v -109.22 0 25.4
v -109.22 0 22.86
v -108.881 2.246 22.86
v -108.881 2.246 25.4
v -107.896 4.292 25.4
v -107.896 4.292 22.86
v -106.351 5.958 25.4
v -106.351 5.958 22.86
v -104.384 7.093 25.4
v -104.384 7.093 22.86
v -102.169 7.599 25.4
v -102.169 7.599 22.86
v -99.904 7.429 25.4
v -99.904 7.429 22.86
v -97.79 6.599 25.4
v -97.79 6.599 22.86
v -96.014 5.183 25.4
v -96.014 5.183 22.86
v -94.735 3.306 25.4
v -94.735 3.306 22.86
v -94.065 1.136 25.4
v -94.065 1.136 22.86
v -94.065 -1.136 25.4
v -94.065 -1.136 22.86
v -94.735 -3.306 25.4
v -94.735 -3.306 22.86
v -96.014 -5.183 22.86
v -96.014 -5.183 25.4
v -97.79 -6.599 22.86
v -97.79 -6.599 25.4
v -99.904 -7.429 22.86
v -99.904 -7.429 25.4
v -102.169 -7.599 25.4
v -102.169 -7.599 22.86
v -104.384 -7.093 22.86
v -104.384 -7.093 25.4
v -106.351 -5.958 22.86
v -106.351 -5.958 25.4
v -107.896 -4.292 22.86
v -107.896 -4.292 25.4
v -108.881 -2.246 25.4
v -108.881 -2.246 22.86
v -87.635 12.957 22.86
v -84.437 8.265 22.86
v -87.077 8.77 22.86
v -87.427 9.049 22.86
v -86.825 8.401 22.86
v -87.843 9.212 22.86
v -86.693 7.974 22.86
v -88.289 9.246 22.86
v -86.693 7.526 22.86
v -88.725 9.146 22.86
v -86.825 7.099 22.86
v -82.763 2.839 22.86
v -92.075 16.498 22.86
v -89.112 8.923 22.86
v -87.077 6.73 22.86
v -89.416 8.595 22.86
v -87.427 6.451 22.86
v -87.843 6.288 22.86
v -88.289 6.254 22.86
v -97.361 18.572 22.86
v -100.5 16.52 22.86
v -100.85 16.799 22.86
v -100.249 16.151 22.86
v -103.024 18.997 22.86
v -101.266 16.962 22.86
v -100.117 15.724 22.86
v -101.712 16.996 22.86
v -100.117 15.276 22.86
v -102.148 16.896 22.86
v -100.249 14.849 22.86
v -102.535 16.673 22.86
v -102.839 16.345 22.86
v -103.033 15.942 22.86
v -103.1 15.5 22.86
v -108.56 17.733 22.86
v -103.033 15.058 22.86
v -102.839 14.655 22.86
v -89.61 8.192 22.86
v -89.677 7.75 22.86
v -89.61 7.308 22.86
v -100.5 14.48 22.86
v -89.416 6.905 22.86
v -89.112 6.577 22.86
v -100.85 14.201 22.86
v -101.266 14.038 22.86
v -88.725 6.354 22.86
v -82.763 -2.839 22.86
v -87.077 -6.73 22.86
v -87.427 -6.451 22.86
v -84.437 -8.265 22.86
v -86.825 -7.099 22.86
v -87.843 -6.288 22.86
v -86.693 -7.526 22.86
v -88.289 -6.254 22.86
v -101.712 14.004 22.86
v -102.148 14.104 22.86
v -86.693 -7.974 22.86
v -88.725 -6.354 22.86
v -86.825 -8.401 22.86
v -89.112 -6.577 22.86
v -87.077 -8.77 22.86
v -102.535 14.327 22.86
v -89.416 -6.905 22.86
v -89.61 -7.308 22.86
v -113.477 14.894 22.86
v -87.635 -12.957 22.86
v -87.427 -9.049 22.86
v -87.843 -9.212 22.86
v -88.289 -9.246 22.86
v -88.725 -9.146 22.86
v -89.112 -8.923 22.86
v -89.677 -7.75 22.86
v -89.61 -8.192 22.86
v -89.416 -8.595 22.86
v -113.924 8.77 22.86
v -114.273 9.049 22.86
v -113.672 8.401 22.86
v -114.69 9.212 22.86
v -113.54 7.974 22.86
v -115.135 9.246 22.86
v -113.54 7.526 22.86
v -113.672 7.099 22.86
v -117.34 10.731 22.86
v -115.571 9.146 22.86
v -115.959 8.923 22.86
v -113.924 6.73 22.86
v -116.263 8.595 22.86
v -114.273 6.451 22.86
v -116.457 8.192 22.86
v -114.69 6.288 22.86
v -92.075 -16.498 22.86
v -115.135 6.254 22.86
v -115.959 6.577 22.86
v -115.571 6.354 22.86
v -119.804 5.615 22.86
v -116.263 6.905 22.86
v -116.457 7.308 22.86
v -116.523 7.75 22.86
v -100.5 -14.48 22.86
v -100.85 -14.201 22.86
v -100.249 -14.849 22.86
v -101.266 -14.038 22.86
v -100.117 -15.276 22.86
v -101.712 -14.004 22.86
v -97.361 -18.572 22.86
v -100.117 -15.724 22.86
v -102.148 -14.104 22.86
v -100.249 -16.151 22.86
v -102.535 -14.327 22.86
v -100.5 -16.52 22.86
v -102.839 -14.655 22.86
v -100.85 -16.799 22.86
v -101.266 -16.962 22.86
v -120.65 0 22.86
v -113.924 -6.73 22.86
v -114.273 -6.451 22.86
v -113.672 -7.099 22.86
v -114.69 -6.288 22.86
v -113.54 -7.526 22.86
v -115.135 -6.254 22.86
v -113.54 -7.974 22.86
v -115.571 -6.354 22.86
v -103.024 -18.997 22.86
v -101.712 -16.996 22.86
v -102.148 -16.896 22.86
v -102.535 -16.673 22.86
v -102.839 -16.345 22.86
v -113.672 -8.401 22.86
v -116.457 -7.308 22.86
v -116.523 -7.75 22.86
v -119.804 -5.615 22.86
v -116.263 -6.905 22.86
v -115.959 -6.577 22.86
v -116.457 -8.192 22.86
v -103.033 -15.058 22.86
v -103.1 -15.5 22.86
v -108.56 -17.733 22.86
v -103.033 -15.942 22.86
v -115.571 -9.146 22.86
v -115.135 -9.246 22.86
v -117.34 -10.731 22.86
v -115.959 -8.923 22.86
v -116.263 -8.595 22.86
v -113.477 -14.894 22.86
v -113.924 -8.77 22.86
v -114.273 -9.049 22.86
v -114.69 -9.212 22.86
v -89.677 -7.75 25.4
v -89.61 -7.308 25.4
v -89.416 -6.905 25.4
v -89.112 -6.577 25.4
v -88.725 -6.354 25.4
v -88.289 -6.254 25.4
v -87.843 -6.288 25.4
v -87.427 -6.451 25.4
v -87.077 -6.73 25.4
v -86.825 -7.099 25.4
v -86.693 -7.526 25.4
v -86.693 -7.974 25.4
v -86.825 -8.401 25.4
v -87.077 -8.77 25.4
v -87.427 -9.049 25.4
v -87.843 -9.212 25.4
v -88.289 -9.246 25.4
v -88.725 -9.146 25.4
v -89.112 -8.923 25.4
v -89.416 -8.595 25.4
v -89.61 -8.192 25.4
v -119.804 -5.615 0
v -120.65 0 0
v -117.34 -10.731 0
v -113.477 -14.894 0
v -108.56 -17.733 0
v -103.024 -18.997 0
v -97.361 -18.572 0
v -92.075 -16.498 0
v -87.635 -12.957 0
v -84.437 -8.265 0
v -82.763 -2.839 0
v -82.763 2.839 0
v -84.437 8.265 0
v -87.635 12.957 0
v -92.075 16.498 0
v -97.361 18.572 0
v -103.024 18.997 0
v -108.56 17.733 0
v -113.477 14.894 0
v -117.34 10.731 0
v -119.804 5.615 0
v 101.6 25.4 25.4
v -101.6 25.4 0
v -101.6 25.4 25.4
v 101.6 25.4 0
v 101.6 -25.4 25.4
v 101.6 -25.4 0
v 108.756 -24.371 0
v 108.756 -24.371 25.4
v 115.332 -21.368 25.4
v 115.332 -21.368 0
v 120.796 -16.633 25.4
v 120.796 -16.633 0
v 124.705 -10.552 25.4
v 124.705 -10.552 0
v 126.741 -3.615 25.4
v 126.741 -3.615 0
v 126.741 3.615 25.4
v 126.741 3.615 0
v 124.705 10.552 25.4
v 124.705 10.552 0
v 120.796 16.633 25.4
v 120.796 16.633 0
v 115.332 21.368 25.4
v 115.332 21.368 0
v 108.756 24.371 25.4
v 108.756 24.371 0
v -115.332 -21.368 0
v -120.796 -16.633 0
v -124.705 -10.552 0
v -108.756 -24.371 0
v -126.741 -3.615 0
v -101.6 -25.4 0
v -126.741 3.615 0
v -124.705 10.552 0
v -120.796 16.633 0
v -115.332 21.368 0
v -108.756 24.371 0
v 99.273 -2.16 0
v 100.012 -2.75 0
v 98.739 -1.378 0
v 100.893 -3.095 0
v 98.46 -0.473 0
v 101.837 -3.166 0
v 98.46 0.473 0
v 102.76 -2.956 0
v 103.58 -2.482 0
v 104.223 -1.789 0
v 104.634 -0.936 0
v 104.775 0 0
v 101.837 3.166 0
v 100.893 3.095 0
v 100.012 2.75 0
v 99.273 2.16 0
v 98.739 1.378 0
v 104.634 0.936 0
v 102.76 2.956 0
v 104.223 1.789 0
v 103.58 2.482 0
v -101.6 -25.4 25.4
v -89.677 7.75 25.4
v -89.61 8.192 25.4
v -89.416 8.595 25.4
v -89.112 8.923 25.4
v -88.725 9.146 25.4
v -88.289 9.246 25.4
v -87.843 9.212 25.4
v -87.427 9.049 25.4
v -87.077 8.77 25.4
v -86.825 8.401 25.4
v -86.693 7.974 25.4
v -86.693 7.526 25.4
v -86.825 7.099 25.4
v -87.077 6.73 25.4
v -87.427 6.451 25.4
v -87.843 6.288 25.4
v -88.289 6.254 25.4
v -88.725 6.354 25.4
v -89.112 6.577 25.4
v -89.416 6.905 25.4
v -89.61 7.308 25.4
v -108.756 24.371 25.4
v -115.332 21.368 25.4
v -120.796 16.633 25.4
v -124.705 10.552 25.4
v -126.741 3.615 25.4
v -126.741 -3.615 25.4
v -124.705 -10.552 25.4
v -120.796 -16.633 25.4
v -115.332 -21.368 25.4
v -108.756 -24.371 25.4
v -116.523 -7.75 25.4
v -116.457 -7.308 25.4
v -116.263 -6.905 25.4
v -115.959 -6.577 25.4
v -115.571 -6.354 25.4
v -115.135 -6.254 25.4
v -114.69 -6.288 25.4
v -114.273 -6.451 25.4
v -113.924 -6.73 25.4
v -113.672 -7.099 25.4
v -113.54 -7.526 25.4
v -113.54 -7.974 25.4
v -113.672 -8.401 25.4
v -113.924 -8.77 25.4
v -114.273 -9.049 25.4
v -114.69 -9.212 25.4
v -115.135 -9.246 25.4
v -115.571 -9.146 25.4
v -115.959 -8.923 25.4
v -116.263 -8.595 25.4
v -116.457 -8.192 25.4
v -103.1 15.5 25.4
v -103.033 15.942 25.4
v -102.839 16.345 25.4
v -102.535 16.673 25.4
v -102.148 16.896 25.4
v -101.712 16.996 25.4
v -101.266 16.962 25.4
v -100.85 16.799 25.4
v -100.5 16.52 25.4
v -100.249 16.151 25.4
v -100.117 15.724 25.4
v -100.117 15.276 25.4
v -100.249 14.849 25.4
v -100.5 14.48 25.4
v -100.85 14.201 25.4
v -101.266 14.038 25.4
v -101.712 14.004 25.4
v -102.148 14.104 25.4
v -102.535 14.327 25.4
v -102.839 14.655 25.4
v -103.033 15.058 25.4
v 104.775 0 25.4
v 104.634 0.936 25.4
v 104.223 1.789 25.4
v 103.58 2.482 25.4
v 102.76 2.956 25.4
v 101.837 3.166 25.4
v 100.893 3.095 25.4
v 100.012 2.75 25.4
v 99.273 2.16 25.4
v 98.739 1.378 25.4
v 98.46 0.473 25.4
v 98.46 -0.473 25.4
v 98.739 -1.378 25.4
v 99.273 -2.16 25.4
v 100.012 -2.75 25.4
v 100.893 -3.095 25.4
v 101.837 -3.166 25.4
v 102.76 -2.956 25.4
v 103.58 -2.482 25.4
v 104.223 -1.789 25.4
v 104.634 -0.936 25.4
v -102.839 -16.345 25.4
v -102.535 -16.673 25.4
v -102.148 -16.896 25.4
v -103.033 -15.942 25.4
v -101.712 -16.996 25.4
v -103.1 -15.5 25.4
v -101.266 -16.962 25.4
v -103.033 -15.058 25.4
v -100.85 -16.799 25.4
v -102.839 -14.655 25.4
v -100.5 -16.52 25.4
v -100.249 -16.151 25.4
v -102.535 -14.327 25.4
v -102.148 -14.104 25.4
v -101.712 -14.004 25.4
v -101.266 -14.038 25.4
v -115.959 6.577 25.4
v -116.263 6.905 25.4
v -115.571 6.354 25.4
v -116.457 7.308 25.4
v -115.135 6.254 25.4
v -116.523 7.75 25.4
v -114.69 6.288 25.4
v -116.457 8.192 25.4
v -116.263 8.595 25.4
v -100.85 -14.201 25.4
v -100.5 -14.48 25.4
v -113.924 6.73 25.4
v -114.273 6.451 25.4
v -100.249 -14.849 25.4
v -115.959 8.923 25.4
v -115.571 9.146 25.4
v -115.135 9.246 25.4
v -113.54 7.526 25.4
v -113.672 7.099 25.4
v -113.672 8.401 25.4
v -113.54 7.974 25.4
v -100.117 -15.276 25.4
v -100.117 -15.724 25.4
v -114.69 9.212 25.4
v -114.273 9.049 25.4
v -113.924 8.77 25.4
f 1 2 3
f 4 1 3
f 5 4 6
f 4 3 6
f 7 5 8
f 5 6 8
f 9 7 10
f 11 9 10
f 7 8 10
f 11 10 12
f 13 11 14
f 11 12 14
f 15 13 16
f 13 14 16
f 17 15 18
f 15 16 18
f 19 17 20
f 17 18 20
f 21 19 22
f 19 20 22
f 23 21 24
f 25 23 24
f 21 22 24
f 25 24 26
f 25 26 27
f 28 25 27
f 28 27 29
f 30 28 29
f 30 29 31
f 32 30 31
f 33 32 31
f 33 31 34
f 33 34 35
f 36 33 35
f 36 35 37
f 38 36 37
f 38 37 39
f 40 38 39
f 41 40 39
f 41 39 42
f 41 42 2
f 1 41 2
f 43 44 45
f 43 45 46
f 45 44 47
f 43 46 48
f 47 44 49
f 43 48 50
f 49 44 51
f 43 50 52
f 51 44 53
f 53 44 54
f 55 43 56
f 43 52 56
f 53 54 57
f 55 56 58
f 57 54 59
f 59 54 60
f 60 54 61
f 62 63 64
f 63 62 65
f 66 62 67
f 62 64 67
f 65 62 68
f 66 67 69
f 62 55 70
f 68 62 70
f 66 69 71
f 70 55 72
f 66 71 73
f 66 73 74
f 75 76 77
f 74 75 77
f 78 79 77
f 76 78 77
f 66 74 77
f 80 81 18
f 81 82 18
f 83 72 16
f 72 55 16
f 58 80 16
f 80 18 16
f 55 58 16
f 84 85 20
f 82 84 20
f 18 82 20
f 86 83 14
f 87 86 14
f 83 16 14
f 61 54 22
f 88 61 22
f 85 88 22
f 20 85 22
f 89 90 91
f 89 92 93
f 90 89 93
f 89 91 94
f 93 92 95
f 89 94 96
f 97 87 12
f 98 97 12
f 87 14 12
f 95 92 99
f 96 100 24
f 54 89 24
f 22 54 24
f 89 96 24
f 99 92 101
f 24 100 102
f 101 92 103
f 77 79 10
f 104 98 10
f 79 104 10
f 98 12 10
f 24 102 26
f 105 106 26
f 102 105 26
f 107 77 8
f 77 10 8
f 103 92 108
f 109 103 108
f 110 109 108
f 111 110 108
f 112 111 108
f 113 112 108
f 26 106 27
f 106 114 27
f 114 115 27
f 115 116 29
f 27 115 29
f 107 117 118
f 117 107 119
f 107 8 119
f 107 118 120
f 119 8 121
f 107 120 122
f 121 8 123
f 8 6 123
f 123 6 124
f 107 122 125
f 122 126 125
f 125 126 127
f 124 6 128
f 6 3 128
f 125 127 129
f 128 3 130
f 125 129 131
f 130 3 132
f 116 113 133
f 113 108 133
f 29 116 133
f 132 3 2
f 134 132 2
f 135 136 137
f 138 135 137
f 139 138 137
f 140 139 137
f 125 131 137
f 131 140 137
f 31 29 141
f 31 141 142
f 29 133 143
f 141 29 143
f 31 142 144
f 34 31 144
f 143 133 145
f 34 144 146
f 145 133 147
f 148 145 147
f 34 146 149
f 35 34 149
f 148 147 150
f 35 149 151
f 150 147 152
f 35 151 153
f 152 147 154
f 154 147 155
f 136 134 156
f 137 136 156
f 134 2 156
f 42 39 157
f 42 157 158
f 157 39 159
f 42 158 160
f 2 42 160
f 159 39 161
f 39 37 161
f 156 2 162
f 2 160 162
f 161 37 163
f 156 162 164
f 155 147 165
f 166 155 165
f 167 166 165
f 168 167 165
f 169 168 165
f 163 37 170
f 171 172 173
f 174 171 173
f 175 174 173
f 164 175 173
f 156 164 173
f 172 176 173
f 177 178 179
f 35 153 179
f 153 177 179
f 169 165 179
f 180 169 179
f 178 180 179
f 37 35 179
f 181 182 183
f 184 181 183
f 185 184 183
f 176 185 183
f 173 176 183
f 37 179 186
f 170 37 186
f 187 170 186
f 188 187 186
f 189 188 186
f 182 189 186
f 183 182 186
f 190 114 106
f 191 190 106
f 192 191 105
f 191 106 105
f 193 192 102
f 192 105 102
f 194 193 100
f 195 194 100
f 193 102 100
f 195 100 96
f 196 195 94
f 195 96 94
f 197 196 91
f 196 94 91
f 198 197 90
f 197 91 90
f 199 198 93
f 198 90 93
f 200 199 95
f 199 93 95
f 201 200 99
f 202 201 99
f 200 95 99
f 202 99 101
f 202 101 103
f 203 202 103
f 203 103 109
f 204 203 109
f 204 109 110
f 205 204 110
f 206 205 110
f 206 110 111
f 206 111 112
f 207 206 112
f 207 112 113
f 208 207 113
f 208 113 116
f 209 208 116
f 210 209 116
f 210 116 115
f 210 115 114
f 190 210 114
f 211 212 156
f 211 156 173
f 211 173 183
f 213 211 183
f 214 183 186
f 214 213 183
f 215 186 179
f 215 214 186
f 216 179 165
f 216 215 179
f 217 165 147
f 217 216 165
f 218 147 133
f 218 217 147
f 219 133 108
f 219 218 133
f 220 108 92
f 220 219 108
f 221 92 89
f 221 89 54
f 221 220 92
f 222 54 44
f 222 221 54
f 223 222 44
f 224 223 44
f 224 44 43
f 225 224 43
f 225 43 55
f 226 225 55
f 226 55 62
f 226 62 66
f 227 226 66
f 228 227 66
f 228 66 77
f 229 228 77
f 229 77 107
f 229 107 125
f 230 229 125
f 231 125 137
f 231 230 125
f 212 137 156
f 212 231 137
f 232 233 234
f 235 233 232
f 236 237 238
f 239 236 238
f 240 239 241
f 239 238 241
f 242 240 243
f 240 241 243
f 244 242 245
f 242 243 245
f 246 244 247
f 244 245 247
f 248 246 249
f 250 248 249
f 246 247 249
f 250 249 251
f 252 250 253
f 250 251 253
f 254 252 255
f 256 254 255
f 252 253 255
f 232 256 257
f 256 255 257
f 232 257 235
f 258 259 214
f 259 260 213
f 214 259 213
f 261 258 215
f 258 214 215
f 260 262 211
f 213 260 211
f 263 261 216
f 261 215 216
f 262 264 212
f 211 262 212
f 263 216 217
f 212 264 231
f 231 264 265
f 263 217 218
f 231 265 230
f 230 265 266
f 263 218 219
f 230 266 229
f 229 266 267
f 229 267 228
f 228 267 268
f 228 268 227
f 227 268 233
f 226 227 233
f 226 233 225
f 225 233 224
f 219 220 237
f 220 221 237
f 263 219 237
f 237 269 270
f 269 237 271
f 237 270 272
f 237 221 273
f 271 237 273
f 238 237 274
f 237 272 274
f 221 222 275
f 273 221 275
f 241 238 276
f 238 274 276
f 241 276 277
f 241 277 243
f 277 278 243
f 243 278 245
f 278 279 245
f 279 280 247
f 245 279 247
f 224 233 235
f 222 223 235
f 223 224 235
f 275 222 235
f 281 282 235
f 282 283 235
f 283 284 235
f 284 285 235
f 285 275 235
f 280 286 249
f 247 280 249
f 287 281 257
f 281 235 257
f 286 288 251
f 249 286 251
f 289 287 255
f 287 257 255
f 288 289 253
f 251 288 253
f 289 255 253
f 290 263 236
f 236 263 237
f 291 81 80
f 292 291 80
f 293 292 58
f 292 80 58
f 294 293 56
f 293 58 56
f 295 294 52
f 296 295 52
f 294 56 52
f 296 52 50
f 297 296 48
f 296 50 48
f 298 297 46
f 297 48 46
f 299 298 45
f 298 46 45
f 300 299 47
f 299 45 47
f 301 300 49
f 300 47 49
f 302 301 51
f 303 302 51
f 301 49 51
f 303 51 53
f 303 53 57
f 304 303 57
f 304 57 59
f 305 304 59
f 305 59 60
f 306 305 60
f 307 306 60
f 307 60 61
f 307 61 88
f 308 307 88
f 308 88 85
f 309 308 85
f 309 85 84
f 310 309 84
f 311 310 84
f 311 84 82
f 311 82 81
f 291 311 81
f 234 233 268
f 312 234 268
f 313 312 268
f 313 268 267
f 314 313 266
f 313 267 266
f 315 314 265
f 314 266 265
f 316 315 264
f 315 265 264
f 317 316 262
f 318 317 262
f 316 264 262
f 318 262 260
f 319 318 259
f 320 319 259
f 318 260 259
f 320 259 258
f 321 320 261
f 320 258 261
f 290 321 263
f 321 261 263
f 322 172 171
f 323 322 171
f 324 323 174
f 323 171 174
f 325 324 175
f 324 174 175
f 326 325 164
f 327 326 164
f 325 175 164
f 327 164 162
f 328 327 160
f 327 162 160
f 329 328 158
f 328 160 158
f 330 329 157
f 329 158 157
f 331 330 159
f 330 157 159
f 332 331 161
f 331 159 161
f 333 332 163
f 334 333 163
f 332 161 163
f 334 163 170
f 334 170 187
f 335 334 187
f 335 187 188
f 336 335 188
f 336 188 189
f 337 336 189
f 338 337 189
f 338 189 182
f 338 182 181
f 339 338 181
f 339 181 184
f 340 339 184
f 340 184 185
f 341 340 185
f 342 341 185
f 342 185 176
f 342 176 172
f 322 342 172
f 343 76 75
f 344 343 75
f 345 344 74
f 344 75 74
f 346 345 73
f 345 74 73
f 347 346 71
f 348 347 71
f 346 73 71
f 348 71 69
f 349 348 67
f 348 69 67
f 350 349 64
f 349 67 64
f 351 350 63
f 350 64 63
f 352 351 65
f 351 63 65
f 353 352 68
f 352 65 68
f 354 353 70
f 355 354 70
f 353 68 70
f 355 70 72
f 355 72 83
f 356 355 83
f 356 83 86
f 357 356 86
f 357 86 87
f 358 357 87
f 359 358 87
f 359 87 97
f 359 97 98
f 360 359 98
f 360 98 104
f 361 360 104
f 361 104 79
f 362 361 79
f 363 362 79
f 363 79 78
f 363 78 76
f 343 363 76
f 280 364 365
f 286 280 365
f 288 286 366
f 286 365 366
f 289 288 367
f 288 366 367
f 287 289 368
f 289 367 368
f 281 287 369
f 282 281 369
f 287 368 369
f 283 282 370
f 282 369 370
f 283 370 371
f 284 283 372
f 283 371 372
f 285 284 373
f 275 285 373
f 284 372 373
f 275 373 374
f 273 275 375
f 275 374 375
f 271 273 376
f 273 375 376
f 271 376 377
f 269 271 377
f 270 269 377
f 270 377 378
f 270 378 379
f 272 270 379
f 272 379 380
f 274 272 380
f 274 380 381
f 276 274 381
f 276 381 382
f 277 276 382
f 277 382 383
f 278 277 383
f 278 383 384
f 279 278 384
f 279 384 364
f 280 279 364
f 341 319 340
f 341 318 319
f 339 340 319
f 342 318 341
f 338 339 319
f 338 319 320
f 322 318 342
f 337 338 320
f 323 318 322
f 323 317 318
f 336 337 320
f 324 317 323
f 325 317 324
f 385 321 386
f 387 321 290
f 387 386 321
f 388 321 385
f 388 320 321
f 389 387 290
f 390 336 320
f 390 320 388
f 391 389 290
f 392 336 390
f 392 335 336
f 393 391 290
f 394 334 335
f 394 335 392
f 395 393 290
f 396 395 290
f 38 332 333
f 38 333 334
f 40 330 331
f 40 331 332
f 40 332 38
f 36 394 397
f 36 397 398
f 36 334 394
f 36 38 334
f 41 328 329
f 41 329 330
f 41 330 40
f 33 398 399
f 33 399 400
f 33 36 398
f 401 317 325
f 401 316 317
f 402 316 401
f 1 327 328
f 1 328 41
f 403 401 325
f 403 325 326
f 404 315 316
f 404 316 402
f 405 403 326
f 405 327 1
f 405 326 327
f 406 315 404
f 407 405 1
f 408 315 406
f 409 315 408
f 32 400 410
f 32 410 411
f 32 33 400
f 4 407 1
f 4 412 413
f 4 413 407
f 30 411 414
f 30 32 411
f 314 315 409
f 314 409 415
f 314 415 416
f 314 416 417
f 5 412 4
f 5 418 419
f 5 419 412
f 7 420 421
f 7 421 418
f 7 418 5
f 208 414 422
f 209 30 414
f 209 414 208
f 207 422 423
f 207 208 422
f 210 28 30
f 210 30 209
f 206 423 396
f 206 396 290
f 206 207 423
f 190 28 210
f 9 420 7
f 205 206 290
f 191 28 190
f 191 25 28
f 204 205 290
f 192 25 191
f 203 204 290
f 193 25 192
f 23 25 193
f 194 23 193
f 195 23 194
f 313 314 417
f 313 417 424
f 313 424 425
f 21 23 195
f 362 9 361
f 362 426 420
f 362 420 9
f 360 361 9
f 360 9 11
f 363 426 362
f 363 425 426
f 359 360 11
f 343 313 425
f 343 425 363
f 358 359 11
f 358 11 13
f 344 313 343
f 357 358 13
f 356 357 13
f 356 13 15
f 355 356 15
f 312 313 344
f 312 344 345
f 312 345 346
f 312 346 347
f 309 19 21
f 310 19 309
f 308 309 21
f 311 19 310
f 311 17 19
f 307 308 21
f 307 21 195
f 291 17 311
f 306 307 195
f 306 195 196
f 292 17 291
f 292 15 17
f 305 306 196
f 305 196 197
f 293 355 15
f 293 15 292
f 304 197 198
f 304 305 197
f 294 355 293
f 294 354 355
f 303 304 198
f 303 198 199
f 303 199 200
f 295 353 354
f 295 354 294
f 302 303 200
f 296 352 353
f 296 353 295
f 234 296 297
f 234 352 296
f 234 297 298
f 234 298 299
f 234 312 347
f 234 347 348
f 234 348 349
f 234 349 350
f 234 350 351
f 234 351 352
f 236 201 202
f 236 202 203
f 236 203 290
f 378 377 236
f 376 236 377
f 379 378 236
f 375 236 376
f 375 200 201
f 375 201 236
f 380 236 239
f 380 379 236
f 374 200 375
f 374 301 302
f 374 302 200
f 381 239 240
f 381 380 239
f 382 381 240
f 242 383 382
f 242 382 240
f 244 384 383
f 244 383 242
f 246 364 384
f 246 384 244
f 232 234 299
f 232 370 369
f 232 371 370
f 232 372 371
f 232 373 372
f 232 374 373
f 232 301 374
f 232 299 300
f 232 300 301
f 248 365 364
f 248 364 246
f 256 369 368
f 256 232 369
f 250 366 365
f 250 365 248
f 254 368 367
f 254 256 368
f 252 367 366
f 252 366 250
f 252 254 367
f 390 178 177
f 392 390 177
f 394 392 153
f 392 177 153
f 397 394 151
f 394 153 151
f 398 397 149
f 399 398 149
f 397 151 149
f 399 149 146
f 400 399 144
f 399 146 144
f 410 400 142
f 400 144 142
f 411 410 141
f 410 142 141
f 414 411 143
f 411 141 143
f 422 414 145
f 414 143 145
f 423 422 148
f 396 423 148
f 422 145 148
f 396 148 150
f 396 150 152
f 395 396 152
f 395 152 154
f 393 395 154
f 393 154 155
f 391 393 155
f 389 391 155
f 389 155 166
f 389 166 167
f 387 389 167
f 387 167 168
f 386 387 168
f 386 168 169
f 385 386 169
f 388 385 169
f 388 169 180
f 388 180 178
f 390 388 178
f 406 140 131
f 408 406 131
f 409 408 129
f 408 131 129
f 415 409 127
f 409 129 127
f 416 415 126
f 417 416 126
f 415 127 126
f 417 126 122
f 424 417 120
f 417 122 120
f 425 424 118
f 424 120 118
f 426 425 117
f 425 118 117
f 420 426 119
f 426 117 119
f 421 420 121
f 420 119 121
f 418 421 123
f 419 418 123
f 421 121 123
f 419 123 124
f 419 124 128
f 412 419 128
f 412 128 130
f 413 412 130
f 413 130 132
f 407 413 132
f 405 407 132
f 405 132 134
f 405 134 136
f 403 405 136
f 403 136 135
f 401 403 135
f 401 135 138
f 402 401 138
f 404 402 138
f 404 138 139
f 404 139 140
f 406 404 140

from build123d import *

# Parameters (mm, degrees)
SKETCH1_R           = 25.4
SKETCH1_W           = 203.2
SKETCH1_H           = 50.8
BOSS_EXTRUDE1_DEPTH = 25.4
SKETCH2_R           = 19.05
CUT_EXTRUDE1_DEPTH  = 22.86
SKETCH4_R           = 7.62
SKETCH4_R_2         = 1.500000048
CUT_EXTRUDE2_DEPTH  = 132.517069615
SKETCH3_R           = 3.175
CUT_EXTRUDE3_DEPTH  = 132.982271537


with BuildPart() as part:
    # Sketch1 → Boss-Extrude1 (new body)
    with BuildSketch(Plane.XY):
        with Locations((-101.6, 0)):
            Circle(SKETCH1_R)
        with Locations((101.6, 0)):
            Circle(SKETCH1_R)
        Rectangle(SKETCH1_W, SKETCH1_H)
    extrude(amount=BOSS_EXTRUDE1_DEPTH)

    # Sketch2 → Cut-Extrude1 (cut)
    with BuildSketch(Plane.XY):
        with Locations(Location((-101.6, 0, 0), (0, 0, 180))):
            Circle(SKETCH2_R)
    extrude(amount=CUT_EXTRUDE1_DEPTH, mode=Mode.SUBTRACT)

    # Sketch4 → Cut-Extrude2 (cut, through all)
    with BuildSketch(Plane(origin=(0, 0, 22.86), x_dir=(-1, 0, 0), z_dir=(0, 0, -1))):
        with Locations((101.6, 0)):
            Circle(SKETCH4_R)
        with Locations((101.6, 15.499999988)):
            Circle(SKETCH4_R_2)
        with Locations((115.023393748, 7.749999994)):
            Circle(SKETCH4_R_2)
        with Locations((115.023393748, -7.749999994)):
            Circle(SKETCH4_R_2)
        with Locations((101.6, -15.499999988)):
            Circle(SKETCH4_R_2)
        with Locations((88.176606252, -7.749999994)):
            Circle(SKETCH4_R_2)
        with Locations((88.176606252, 7.749999994)):
            Circle(SKETCH4_R_2)
    extrude(amount=-CUT_EXTRUDE2_DEPTH, mode=Mode.SUBTRACT)

    # Sketch3 → Cut-Extrude3 (cut, through all)
    with BuildSketch(Plane.XY.offset(25.4)):
        with Locations((101.6, 0)):
            Circle(SKETCH3_R)
    extrude(amount=-CUT_EXTRUDE3_DEPTH, mode=Mode.SUBTRACT)


solid = part.part
